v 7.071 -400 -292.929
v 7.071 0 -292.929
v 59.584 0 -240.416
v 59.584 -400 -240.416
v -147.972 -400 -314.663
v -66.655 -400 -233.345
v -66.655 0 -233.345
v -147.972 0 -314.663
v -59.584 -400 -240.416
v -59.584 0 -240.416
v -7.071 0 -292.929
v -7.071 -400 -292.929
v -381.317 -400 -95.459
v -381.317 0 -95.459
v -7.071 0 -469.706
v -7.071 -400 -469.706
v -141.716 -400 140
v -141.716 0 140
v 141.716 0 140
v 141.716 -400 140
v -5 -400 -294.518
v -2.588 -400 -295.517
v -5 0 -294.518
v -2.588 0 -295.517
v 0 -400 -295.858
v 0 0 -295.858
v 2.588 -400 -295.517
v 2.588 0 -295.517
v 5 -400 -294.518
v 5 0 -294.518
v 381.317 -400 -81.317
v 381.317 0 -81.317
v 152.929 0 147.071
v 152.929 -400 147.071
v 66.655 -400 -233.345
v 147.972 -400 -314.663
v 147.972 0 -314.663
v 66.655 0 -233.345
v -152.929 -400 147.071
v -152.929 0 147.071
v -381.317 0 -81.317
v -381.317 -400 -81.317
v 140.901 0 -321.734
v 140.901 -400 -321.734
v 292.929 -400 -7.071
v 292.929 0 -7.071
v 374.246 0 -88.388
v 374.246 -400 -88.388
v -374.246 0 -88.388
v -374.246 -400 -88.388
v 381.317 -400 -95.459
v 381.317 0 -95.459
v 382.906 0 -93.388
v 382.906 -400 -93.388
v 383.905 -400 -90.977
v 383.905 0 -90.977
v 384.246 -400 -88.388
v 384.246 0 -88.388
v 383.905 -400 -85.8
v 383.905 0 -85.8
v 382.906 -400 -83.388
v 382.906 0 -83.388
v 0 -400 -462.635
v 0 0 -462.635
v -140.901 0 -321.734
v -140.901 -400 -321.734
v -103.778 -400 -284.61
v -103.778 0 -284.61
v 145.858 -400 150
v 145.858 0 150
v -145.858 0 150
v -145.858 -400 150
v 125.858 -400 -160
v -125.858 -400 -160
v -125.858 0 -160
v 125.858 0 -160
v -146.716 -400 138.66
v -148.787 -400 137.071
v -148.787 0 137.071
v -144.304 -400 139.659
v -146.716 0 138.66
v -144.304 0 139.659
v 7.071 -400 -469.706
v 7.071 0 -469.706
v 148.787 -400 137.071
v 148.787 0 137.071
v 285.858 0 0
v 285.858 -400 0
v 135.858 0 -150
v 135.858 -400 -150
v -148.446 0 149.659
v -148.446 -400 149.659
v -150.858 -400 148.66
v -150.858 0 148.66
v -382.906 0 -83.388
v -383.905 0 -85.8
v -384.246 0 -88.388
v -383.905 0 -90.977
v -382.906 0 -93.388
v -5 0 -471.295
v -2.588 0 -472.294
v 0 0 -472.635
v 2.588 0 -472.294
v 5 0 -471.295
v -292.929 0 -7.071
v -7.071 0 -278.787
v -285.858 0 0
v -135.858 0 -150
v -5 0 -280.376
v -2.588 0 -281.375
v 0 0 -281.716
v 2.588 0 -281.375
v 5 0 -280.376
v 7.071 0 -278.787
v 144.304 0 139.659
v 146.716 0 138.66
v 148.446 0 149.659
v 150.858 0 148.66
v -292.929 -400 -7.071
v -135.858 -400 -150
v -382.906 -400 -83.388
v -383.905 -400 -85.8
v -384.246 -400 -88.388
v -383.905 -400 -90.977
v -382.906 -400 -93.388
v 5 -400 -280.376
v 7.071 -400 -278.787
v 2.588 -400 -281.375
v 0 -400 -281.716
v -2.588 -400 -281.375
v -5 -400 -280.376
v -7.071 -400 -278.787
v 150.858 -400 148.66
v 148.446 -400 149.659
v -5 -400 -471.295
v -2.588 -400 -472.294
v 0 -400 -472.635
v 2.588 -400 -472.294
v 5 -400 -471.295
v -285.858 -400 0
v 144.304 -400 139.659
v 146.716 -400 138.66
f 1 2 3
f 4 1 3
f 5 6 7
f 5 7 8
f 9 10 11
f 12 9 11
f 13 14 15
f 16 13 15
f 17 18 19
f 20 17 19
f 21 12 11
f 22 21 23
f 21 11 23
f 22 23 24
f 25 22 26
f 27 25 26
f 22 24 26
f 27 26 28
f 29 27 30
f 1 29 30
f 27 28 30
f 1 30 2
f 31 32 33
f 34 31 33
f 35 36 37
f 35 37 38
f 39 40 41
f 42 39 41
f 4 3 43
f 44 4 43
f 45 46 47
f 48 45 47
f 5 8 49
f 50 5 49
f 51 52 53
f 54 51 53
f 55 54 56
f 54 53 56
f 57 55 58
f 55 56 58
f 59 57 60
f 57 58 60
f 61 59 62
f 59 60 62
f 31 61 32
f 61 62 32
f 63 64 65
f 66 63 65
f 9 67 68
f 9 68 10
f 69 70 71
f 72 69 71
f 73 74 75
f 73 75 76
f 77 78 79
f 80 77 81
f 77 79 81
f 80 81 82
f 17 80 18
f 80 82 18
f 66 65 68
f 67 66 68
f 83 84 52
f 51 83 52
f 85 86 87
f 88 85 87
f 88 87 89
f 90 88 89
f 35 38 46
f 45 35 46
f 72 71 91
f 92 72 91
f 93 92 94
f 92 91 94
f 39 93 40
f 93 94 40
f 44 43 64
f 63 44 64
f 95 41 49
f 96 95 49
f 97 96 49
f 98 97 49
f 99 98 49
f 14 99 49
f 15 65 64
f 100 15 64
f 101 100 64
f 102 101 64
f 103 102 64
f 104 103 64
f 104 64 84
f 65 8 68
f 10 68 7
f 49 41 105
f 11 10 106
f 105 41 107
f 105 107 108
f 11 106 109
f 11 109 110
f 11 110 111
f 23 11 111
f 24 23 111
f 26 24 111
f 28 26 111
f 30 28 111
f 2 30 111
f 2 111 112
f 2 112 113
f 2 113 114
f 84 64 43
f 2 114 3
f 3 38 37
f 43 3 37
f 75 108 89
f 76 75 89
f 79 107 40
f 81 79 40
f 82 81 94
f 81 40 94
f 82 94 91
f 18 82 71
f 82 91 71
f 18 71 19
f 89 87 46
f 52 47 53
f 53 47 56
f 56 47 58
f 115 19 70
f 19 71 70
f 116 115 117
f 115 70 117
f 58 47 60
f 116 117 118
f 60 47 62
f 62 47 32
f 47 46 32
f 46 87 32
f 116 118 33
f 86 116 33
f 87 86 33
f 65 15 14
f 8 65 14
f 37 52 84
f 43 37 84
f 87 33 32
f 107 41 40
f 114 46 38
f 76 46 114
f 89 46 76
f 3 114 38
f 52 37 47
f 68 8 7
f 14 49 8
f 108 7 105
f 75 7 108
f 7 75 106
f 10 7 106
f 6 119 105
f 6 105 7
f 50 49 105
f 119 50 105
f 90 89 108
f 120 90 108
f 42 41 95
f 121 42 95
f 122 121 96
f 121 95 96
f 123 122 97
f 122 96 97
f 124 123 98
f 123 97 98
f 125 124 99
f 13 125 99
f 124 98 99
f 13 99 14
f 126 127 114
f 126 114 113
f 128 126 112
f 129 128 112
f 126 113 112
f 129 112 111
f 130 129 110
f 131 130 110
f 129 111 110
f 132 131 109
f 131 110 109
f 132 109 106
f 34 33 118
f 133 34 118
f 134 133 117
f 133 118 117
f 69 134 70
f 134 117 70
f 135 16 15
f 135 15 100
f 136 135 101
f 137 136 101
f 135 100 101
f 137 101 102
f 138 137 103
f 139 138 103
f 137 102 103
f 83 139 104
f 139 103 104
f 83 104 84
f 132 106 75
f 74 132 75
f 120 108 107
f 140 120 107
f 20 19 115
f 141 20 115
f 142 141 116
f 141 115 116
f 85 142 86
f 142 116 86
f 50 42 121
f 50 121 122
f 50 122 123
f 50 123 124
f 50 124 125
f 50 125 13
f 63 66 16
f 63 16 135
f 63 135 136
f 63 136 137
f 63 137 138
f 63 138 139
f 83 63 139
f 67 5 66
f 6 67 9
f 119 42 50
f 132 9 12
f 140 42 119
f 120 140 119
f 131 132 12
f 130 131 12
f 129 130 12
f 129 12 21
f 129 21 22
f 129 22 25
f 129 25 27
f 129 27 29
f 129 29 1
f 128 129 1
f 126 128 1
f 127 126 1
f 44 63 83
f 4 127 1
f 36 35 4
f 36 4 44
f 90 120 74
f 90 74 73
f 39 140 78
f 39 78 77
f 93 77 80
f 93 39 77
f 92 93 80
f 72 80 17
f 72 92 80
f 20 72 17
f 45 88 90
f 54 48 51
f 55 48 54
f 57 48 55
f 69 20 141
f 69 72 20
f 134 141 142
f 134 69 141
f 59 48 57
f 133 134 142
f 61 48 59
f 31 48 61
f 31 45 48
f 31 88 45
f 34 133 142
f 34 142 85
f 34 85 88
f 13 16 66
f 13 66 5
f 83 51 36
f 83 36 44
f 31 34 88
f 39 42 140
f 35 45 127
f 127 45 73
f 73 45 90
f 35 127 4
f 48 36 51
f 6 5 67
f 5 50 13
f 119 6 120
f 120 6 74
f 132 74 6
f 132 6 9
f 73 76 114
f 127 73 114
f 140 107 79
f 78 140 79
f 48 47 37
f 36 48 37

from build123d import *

# Parameters (mm, degrees)
F1_DEPTH = 400


# Not quite as in the source:
# - a feature names something its author has since deleted; it is built from what else it names


with BuildPart() as f1:
    # F0 (on Front) → F1 (new body)
    with BuildSketch(Plane.XZ):
        with BuildLine():
            Line((-292.9289321881, -7.0710678119), (-300, 0))
            Line((-300, 0), (-381.3172798365, -81.3172798365))
            ThreePointArc((-381.3172798365, -81.3172798365), (-384.2462120246, -88.3883476483), (-381.3172798365, -95.4594154602))
            Line((-381.3172798365, -95.4594154602), (-155.0431098568, -321.7335854399))
            ThreePointArc((-155.0431098568, -321.7335854399), (-147.9720420449, -324.662517628), (-140.900974233, -321.7335854399))
            Line((-140.900974233, -321.7335854399), (-103.7778682207, -284.6104794276))
            Line((-103.7778682207, -284.6104794276), (-59.5836943966, -240.4163056034))
            Line((-59.5836943966, -240.4163056034), (-66.6547622084, -233.3452377916))
            Line((-66.6547622085, -233.3452377916), (-147.9720420449, -314.662517628))
            Line((-147.9720420449, -314.662517628), (-374.2462120246, -88.3883476483))
            Line((-374.2462120246, -88.3883476483), (-292.9289321882, -7.0710678119))
        make_face()
        with BuildLine():
            Line((-152.9289321881, 147.0710678119), (-300, 0))
            Line((-300, 0), (-292.9289321881, -7.0710678119))
            Line((-292.9289321881, -7.0710678119), (-150, -150))
            Line((-150, -150), (-66.6547622084, -233.3452377916))
            Line((-66.6547622084, -233.3452377916), (-59.5836943966, -240.4163056034))
            Line((-59.5836943966, -240.4163056034), (-7.0710678119, -292.9289321881))
            ThreePointArc((-7.0710678119, -292.9289321881), (0, -295.8578643763), (7.0710678119, -292.9289321881))
            Line((7.0710678119, -292.9289321881), (59.5836943966, -240.4163056034))
            Line((59.5836943966, -240.4163056034), (66.6547622084, -233.3452377916))
            Line((66.6547622084, -233.3452377916), (150, -150))
            Line((150, -150), (225.0000048894, -74.9999951106))
            Line((225.0000048894, -74.9999951106), (292.9289321881, -7.0710678119))
            Line((292.9289321881, -7.0710678119), (300, 0))
            Line((300, 0), (152.9289321881, 147.0710678119))
            ThreePointArc((152.9289321881, 147.0710678119), (149.6846986999, 149.2387953251), (145.8578643763, 150))
            Line((145.8578643763, 150), (-145.8578643763, 150))
            ThreePointArc((-145.8578643763, 150), (-149.6846986999, 149.2387953251), (-152.9289321881, 147.0710678119))
        make_face()
        with BuildLine():
            ThreePointArc((7.0710678119, -278.7867965644), (0, -281.7157287525), (-7.0710678119, -278.7867965644))
            Line((-7.0710678119, -278.7867965644), (-125.8578643763, -160))
            Line((-125.8578643763, -160), (-135.8578643763, -150))
            Line((-135.8578643763, -150), (-210.8578643763, -75))
            Line((-210.8578643763, -75), (-285.8578643763, 0))
            Line((-285.8578643763, 0), (-148.7867965644, 137.0710678118))
            ThreePointArc((-148.7867965644, 137.0710678118), (-145.5425630762, 139.2387953251), (-141.7157287526, 140))
            Line((-141.7157287526, 140), (141.7157287525, 140))
            ThreePointArc((141.7157287525, 140), (145.5425630762, 139.2387953251), (148.7867965644, 137.0710678119))
            Line((148.7867965644, 137.0710678119), (285.8578643762, 0))
            Line((285.8578643762, 0), (210.8578643762, -75))
            Line((210.8578643762, -75), (135.8578643762, -150))
            Line((135.8578643762, -150), (125.8578643762, -160))
            Line((125.8578643762, -160), (7.0710678119, -278.7867965644))
        make_face(mode=Mode.SUBTRACT)
        with BuildLine():
            ThreePointArc((-140.900974233, -321.7335854399), (-147.9720420449, -324.662517628), (-155.0431098568, -321.7335854399))
            Line((-155.0431098568, -321.7335854399), (-7.0710678119, -469.7056274848))
            ThreePointArc((-7.0710678119, -469.7056274848), (0, -472.6345596729), (7.0710678119, -469.7056274848))
            Line((7.0710678119, -469.7056274848), (155.0431098568, -321.7335854399))
            ThreePointArc((155.0431098568, -321.7335854399), (147.9720420449, -324.662517628), (140.900974233, -321.7335854399))
            Line((140.900974233, -321.7335854399), (0, -462.6345596729))
            Line((0, -462.6345596729), (-140.900974233, -321.7335854399))
        make_face()
        with BuildLine():
            Line((381.3172798364, -81.3172798364), (300, 0))
            Line((300, 0), (292.9289321881, -7.0710678119))
            Line((292.9289321881, -7.0710678118), (374.2462120246, -88.3883476483))
            Line((374.2462120246, -88.3883476483), (147.9720420449, -314.662517628))
            Line((147.9720420449, -314.662517628), (66.6547622084, -233.3452377915))
            Line((66.6547622084, -233.3452377916), (59.5836943966, -240.4163056034))
            Line((59.5836943966, -240.4163056034), (140.900974233, -321.7335854399))
            ThreePointArc((140.900974233, -321.7335854399), (147.9720420449, -324.662517628), (155.0431098568, -321.7335854399))
            Line((155.0431098568, -321.7335854399), (381.3172798364, -95.4594154602))
            ThreePointArc((381.3172798364, -95.4594154602), (384.2462120246, -88.3883476483), (381.3172798364, -81.3172798364))
        make_face()
        Polygon((-135.8578643763, -150), (-125.8578643763, -160), (125.8578643762, -160), (135.8578643762, -150), align=None)
    extrude(amount=F1_DEPTH)


solid = f1.part
